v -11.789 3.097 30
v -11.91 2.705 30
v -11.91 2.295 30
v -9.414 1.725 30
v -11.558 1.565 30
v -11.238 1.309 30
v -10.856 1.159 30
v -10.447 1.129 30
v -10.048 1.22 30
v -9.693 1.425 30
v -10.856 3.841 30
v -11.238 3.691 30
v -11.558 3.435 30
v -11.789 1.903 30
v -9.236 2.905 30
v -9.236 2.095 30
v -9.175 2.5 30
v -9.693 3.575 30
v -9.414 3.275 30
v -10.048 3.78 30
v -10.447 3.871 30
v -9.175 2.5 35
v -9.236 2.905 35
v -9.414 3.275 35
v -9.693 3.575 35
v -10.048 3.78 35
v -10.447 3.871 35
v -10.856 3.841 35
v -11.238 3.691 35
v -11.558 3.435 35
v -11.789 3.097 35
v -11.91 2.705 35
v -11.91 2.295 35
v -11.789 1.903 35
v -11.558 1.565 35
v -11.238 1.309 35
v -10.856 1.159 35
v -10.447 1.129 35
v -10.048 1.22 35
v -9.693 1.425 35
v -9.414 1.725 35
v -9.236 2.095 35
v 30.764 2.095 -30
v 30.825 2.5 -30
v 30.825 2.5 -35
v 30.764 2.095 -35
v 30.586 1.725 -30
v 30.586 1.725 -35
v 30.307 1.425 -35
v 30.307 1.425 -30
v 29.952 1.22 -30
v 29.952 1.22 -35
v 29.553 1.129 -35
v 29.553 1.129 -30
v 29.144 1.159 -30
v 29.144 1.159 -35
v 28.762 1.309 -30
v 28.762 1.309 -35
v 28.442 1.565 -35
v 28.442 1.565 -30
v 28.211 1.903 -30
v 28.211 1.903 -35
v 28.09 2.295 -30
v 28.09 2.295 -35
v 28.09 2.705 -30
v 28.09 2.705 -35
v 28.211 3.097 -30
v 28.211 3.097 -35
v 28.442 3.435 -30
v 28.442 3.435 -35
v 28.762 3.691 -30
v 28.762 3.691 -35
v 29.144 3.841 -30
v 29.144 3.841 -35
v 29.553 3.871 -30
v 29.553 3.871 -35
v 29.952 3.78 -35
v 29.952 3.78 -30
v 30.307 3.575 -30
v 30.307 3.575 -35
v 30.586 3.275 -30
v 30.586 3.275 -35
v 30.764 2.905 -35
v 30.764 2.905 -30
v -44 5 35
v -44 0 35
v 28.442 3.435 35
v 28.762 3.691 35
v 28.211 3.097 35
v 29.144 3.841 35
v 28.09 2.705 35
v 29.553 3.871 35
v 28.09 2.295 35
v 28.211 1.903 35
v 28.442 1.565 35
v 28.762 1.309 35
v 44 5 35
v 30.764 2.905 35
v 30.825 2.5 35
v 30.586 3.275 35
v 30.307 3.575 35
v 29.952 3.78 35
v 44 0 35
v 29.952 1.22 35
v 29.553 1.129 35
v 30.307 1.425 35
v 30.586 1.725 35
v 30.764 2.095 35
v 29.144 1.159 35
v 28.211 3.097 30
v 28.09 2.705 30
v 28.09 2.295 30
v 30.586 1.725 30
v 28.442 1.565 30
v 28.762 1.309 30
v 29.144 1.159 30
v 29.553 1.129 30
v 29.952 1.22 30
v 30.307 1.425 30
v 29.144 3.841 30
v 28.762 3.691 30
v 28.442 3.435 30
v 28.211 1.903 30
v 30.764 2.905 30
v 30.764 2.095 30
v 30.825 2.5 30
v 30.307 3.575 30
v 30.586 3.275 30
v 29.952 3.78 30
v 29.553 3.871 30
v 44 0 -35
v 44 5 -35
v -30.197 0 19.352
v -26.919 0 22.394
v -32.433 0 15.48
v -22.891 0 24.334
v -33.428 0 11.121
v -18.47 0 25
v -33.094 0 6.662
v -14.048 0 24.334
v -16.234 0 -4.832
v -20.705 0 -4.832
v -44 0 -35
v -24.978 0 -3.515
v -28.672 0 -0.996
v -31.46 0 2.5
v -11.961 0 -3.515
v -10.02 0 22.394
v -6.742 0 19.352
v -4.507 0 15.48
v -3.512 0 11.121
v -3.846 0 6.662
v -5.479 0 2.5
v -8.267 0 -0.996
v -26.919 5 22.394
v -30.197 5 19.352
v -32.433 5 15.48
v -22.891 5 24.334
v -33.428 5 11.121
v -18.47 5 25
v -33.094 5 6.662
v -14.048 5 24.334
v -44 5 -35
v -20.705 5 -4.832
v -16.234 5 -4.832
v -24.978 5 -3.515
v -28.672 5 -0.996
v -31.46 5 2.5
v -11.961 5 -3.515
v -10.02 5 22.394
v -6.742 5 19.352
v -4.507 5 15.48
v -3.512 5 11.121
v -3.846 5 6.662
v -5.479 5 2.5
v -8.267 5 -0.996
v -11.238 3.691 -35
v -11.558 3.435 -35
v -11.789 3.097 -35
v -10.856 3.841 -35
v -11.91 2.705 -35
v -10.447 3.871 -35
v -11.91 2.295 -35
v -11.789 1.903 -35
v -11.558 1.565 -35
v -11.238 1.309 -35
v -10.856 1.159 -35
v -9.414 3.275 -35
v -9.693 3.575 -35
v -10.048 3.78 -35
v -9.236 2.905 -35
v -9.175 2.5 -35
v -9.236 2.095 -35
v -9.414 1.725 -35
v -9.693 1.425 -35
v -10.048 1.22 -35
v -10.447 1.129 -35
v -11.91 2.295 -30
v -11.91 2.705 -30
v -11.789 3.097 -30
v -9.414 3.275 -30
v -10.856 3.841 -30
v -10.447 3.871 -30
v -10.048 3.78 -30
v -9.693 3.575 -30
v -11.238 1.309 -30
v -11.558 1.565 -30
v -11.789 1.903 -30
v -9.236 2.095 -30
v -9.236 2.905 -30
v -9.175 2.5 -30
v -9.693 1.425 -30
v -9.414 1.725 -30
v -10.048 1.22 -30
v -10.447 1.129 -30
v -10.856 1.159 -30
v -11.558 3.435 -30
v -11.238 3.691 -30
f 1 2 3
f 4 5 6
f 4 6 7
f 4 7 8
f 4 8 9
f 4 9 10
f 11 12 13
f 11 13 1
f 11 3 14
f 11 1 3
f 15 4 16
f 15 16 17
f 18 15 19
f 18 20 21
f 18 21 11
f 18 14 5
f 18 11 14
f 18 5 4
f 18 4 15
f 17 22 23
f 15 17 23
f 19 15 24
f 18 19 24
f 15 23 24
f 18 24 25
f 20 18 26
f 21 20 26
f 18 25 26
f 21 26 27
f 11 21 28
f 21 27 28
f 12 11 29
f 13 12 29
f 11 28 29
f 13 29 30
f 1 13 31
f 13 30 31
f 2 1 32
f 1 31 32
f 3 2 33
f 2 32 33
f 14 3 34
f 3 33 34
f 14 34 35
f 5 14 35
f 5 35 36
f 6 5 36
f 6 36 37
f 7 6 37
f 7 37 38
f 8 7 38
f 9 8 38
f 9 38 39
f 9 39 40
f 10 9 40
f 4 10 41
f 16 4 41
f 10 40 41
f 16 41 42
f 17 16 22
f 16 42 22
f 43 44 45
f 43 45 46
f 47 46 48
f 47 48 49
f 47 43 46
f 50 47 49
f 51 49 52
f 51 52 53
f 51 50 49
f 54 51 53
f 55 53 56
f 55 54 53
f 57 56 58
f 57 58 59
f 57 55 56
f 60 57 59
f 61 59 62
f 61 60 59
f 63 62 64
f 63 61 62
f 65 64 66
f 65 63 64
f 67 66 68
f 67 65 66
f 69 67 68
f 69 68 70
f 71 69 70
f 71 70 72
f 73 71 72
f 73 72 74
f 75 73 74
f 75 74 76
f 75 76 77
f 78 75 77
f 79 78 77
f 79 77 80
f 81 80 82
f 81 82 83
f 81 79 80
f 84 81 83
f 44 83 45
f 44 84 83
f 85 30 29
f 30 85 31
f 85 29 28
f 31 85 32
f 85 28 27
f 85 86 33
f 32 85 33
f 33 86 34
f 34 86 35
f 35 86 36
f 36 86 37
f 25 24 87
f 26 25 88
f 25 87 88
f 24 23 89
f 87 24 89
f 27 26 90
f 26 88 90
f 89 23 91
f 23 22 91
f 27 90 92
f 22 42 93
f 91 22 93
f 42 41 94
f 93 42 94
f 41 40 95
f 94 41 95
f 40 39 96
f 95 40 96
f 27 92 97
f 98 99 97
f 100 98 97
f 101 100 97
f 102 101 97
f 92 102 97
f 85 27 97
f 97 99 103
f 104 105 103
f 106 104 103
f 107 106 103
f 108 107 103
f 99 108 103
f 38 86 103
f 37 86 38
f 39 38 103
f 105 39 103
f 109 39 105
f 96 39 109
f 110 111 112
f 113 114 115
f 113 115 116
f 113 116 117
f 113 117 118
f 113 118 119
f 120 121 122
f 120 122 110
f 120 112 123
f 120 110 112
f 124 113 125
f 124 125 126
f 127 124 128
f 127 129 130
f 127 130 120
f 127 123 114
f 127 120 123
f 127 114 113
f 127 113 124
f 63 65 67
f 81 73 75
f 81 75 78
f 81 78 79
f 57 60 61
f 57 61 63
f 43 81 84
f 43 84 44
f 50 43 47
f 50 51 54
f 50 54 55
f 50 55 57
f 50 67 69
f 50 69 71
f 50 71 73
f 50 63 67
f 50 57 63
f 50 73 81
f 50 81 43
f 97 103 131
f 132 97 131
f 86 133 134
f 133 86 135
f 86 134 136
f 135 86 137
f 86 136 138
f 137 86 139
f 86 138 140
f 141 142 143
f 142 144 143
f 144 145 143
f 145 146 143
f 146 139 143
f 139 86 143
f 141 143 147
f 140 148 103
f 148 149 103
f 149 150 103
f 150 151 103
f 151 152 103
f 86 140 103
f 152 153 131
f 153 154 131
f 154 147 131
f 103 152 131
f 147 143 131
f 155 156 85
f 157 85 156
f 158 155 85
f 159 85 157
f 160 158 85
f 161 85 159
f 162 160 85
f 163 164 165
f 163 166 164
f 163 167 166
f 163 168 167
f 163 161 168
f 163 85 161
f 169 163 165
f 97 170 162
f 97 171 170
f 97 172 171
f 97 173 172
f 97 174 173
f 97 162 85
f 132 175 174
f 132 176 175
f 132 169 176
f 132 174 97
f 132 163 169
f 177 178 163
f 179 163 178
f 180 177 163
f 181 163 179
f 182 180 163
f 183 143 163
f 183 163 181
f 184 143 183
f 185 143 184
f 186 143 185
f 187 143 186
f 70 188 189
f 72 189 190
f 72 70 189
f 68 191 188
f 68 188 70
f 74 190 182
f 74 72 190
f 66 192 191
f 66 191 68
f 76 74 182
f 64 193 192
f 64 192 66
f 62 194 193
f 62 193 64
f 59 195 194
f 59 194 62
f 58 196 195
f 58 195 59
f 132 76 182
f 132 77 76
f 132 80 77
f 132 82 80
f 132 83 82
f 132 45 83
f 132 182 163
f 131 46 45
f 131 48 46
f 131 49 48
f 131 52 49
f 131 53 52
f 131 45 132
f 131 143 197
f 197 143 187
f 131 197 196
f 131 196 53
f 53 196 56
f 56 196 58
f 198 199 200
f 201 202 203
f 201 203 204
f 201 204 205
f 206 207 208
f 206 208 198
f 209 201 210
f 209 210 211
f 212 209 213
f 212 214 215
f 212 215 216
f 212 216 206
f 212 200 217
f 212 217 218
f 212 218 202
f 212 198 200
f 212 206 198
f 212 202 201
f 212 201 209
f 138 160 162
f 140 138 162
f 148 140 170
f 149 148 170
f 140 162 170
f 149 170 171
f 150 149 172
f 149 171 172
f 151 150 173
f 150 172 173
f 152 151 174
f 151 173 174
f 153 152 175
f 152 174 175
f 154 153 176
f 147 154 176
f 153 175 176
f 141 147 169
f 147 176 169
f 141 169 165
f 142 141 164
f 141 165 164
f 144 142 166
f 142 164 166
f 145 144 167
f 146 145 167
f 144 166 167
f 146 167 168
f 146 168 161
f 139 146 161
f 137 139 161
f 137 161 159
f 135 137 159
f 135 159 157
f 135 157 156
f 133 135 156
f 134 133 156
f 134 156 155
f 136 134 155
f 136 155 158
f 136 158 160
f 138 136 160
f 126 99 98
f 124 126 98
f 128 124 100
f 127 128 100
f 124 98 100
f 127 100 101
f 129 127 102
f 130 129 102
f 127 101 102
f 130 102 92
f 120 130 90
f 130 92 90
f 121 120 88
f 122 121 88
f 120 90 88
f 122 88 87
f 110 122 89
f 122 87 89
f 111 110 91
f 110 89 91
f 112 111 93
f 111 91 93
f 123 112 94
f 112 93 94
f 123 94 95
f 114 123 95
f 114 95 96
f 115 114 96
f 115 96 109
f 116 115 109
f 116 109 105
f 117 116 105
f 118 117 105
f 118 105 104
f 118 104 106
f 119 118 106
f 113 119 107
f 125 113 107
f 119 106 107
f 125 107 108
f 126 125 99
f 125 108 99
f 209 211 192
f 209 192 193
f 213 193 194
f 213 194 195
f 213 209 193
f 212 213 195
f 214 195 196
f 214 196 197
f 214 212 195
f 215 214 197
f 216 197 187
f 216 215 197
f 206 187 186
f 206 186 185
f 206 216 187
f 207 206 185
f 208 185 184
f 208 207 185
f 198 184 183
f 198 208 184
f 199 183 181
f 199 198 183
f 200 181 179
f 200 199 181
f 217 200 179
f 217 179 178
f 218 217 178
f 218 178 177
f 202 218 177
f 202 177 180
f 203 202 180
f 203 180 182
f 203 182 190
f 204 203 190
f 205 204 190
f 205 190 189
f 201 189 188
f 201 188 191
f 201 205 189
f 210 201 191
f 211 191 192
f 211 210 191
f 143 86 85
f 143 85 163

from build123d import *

# Parameters (mm, degrees)
SKETCH1_W           = 88
SKETCH1_H           = 70
BOSS_EXTRUDE1_DEPTH = 5
SKETCH2_R           = 1.375
CUT_EXTRUDE1_DEPTH  = 5
CUT_EXTRUDE2_START  = -5
SKETCH4_R           = 1.375
CUT_EXTRUDE2_DEPTH  = 5
SKETCH5_R           = 15
CUT_EXTRUDE3_DEPTH  = 57.444663167


with BuildPart() as part:
    # Sketch1 → Boss-Extrude1 (new body)
    with BuildSketch(Plane(origin=(0, 0, 0), x_dir=(1, 0, 0), z_dir=(0, 1, 0))):
        Rectangle(SKETCH1_W, SKETCH1_H)
    extrude(amount=BOSS_EXTRUDE1_DEPTH)

    # Sketch2 → Cut-Extrude1 (cut)
    with BuildSketch(Plane.XY.offset(35)):
        with Locations((-10.55, 2.5)):
            Circle(SKETCH2_R)
        with Locations((29.45, 2.5)):
            Circle(SKETCH2_R)
    extrude(amount=-CUT_EXTRUDE1_DEPTH, mode=Mode.SUBTRACT)

    # Sketch4 → Cut-Extrude2 (cut)
    with BuildSketch(Plane(origin=(0, 0, -35), x_dir=(-1, 0, 0), z_dir=(0, 0, -1)).offset(CUT_EXTRUDE2_START)):
        with Locations(Location((-29.45, 2.5, 0), (0, 0, 180))):
            Circle(SKETCH4_R)
        with Locations(Location((10.55, 2.5, 0), (0, 0, 180))):
            Circle(SKETCH4_R)
    extrude(amount=CUT_EXTRUDE2_DEPTH, mode=Mode.SUBTRACT)

    # Sketch5 → Cut-Extrude3 (cut, through all)
    with BuildSketch(Plane(origin=(0, 5, 0), x_dir=(1, 0, 0), z_dir=(0, 1, 0))):
        with Locations(Location((-18.469657797, -10, 0), (0, 0, 270))):
            Circle(SKETCH5_R)
    extrude(amount=-CUT_EXTRUDE3_DEPTH, mode=Mode.SUBTRACT)


solid = part.part
